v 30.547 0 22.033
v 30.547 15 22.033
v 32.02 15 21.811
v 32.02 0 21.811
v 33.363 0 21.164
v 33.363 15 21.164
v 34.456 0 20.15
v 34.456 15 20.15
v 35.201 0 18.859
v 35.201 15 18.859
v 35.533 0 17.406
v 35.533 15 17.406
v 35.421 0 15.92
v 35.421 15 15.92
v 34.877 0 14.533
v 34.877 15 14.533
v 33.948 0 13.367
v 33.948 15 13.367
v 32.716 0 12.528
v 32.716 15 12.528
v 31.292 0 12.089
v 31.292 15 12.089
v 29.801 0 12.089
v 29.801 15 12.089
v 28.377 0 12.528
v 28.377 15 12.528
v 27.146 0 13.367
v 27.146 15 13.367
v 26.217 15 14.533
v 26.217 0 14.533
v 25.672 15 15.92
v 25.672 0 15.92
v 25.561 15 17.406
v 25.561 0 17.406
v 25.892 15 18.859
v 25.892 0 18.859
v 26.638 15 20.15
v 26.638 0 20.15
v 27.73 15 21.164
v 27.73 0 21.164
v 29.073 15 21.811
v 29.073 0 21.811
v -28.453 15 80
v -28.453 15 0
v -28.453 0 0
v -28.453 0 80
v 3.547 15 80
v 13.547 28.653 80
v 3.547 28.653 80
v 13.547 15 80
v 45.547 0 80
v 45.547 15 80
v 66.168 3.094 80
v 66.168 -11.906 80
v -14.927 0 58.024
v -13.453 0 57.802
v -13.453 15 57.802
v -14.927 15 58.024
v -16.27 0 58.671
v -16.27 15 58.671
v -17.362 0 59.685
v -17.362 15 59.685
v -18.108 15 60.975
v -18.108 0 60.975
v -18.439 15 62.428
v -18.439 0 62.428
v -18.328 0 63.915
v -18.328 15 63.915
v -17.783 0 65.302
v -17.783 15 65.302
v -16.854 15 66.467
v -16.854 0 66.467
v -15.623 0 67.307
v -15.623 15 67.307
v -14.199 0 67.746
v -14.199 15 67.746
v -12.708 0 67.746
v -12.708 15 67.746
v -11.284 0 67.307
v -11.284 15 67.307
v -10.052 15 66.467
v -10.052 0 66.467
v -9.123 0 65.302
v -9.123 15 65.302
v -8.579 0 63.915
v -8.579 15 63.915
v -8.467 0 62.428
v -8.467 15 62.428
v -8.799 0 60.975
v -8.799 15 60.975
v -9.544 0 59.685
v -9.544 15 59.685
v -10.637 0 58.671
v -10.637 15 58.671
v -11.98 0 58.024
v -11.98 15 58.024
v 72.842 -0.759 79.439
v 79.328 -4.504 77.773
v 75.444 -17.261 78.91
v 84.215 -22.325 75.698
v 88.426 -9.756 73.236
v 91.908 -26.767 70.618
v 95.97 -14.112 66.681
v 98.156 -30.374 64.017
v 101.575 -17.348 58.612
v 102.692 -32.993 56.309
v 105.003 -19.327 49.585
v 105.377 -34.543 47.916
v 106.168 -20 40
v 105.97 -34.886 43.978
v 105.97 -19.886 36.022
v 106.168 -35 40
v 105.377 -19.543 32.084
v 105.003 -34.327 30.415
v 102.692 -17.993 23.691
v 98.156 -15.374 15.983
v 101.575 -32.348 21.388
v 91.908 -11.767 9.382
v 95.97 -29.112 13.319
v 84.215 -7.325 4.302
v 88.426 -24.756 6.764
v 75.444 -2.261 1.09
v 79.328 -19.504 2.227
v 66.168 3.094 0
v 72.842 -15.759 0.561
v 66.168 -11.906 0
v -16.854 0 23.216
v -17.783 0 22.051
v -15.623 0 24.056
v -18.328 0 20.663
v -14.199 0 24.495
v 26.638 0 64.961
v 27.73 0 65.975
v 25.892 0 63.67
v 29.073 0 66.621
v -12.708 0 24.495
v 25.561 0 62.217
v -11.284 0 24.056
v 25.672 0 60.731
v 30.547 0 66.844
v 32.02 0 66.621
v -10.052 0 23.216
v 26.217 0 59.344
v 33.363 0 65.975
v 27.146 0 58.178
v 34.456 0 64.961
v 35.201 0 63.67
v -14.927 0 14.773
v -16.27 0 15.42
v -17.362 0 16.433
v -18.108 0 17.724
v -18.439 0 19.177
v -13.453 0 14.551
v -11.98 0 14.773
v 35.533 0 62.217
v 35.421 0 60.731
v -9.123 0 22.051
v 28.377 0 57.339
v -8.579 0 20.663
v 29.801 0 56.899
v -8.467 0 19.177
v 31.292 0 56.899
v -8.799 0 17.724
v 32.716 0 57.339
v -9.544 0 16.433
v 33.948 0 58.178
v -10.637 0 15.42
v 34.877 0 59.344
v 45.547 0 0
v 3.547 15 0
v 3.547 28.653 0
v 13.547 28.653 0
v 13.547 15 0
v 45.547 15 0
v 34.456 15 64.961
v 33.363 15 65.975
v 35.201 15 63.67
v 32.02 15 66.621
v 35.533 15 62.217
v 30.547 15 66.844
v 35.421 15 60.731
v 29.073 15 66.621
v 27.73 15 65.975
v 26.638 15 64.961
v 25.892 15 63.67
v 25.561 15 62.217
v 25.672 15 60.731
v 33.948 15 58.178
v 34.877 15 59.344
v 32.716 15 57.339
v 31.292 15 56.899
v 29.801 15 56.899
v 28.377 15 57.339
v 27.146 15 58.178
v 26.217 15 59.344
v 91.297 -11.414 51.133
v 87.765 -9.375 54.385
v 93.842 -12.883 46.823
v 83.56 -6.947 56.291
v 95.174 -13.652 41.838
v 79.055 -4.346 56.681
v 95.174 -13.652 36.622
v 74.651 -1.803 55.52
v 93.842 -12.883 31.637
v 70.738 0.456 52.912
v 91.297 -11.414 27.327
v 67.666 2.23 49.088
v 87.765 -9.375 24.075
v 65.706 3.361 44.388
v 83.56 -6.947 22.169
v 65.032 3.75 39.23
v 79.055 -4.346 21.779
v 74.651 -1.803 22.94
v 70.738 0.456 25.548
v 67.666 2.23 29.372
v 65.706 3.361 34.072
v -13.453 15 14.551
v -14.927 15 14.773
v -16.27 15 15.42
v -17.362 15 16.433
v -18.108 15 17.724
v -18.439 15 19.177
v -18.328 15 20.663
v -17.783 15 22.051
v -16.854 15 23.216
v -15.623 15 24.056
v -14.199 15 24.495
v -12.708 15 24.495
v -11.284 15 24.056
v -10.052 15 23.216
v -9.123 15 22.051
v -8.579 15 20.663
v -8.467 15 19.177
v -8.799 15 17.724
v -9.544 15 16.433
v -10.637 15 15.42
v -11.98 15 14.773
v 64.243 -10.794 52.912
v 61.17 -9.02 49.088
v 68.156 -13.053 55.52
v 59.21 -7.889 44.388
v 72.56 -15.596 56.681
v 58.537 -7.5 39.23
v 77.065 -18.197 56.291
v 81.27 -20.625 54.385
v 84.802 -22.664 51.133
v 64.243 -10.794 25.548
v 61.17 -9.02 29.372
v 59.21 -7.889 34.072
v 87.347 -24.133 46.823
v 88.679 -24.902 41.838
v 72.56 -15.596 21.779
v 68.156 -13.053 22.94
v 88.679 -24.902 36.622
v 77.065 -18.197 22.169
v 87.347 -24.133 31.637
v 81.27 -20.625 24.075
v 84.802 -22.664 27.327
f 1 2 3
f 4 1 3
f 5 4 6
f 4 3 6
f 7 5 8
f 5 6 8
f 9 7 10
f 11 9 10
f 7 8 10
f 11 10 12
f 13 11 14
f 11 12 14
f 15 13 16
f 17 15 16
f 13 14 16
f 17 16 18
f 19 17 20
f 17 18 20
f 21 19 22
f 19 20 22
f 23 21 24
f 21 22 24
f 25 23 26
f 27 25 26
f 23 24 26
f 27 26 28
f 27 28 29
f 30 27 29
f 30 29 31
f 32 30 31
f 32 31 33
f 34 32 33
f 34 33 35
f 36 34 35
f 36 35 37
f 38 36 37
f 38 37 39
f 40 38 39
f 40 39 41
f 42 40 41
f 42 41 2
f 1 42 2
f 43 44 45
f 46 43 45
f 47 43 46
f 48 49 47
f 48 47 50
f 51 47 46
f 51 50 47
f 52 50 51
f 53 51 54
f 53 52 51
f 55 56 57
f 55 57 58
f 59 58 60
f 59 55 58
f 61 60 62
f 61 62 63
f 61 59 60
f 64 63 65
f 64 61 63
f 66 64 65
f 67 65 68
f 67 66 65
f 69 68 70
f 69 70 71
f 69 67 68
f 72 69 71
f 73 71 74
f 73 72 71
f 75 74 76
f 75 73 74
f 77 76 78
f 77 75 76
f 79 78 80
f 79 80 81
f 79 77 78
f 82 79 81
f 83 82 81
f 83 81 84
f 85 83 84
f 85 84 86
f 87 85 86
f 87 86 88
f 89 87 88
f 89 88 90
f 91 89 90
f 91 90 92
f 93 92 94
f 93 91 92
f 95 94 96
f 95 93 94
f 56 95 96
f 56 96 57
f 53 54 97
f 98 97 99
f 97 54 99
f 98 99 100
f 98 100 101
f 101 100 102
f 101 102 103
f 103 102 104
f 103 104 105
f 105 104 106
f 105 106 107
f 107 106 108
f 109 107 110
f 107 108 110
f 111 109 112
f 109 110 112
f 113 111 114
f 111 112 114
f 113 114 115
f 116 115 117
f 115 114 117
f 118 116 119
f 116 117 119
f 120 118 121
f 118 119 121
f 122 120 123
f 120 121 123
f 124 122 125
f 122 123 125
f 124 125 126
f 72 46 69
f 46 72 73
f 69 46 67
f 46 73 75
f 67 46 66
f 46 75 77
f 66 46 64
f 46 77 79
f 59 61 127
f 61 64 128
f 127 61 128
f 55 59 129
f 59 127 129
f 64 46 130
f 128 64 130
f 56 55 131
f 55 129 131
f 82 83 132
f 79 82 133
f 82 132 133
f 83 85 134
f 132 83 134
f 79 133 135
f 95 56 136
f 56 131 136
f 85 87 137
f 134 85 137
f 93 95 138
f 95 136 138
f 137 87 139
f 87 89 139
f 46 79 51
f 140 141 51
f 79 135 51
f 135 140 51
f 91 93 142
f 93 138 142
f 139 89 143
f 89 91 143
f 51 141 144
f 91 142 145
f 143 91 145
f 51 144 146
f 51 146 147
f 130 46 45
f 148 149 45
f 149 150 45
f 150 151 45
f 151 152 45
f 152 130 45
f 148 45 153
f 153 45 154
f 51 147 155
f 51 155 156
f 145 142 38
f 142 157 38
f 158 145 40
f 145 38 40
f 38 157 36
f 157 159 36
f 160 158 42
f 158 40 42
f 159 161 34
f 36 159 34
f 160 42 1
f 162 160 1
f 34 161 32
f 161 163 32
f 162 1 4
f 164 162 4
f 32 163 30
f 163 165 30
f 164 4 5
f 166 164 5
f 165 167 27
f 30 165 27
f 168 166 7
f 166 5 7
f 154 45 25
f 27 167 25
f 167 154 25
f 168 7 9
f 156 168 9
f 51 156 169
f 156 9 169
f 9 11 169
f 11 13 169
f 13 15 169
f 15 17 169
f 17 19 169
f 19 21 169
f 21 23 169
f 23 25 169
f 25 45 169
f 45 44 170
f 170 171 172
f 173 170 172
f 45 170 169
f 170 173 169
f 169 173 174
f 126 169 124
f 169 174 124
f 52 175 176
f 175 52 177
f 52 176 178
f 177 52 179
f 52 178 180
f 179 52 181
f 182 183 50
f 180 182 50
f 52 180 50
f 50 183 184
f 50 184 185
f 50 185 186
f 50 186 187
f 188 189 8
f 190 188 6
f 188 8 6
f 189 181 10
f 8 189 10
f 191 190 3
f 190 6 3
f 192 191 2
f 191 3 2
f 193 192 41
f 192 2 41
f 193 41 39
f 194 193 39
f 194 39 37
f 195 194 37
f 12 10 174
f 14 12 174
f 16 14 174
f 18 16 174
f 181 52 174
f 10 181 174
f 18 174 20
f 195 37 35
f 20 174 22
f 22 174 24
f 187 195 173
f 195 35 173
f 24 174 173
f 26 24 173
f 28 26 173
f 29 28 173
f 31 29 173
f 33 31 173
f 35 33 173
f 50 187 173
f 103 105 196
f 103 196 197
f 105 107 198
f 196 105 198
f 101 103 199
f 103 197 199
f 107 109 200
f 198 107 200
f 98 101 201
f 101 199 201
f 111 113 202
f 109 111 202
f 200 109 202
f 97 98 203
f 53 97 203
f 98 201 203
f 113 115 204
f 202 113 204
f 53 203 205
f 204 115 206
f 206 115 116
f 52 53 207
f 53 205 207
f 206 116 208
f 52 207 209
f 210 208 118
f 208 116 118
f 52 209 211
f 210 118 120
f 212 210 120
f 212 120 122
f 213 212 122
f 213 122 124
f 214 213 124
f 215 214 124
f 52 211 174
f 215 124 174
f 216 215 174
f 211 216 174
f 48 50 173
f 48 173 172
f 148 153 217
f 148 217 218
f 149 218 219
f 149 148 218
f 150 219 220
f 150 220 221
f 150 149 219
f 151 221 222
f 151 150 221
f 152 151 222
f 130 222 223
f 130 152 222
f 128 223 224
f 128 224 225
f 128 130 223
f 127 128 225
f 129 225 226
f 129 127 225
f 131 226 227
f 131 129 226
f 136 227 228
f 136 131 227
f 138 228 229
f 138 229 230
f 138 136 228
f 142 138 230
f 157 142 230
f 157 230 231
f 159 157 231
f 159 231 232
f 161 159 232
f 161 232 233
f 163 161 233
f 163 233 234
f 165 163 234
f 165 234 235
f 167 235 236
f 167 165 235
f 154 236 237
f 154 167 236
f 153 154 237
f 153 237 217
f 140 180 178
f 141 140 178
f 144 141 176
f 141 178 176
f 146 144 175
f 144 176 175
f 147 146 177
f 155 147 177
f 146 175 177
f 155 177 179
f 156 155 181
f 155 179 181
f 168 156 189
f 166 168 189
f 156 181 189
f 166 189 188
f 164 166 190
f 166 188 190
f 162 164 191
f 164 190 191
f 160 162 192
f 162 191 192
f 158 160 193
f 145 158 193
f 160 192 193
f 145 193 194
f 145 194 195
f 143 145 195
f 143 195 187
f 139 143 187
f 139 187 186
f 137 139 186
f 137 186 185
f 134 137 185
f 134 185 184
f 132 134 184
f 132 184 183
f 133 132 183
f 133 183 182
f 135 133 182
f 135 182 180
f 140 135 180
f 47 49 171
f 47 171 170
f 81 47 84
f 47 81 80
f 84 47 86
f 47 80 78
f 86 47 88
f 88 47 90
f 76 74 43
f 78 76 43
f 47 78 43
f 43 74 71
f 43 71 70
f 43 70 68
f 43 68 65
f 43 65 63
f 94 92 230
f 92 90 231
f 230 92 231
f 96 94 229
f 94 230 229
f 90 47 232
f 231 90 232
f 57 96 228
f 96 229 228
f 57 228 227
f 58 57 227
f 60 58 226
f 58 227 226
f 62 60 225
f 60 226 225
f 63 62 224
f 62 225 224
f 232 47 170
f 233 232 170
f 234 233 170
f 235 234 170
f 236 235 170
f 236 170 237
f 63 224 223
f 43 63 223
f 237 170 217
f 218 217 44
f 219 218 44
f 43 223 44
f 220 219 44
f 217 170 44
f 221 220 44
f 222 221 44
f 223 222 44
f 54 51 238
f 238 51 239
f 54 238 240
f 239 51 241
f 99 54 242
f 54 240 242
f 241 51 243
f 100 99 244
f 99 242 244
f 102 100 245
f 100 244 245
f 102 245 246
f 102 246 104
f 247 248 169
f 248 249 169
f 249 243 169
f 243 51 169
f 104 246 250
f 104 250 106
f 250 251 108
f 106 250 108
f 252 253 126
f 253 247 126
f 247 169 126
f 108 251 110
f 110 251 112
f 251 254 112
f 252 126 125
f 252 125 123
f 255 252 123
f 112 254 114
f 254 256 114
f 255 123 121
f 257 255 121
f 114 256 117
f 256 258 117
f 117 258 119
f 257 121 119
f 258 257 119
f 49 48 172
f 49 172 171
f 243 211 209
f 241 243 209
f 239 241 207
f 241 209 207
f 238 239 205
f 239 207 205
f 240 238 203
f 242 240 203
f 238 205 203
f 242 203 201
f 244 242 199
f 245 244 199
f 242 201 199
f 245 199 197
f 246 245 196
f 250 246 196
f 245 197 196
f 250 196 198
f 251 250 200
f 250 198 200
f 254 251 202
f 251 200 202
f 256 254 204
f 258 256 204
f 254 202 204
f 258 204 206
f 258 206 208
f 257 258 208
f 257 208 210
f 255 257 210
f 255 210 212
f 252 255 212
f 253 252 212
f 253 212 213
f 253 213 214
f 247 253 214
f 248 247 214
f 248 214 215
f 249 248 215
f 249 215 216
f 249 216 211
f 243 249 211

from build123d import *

# Parameters (mm, degrees)
BOSS_EXTRUDE1_DEPTH = 80
FILLET1_R           = 40
SKETCH3_R           = 5
CUT_EXTRUDE3_DEPTH  = 15
SKETCH4_R           = 5
CUT_EXTRUDE4_DEPTH  = 80
SKETCH5_R           = 17.5
CUT_EXTRUDE5_DEPTH  = 26


with BuildPart() as part:
    # Sketch2 → Boss-Extrude1 (new body)
    with BuildSketch(Plane.XY):
        Polygon((-28.453333333, 0), (45.546666667, 0), (106.168444932, -35), (106.168444932, -20), (45.546666667, 15), (13.546666667, 15), (13.546666667, 28.653333333), (3.546666667, 28.653333333), (3.546666667, 15), (-28.453333333, 15), align=None)
    extrude(amount=BOSS_EXTRUDE1_DEPTH)

    # Fillet1
    # the kernel refuses this fillet: 40 mm, written as the material it takes off along each edge
    with BuildSketch(Plane(origin=(106.168444932, -135, 0), x_dir=(0, 0, 1), z_dir=(0, 1, 0))) as fillet1_piece_1:
        with BuildLine():
            CenterArc((FILLET1_R, -FILLET1_R), FILLET1_R, 90, 90)
            Line((0, -FILLET1_R), (0, 0))
            Line((0, 0), (FILLET1_R, 0))
        make_face()
    extrude(amount=215, mode=Mode.SUBTRACT)
    with BuildSketch(Plane(origin=(106.168444932, -135, 80), x_dir=(0, 0, -1), z_dir=(0, 1, 0))) as fillet1_piece_2:
        with BuildLine():
            CenterArc((FILLET1_R, FILLET1_R), FILLET1_R, 180, 90)
            Line((0, FILLET1_R), (0, 0))
            Line((0, 0), (FILLET1_R, 0))
        make_face()
    extrude(amount=215, mode=Mode.SUBTRACT)

    # Sketch3 → Cut-Extrude3 (cut)
    with BuildSketch(Plane(origin=(0, 0, 0), x_dir=(1, 0, 0), z_dir=(0, 1, 0))):
        with Locations(Location((-13.453333333, -19.550801078, 0), (0, 0, 90))):
            Circle(SKETCH3_R)
        with Locations(Location((-13.453333333, -62.802123194, 0), (0, 0, 90))):
            Circle(SKETCH3_R)
    extrude(amount=CUT_EXTRUDE3_DEPTH, mode=Mode.SUBTRACT)

    # Sketch4 → Cut-Extrude4 (cut)
    with BuildSketch(Plane(origin=(0, 15, 0), x_dir=(1, 0, 0), z_dir=(0, 1, 0))):
        with Locations(Location((30.546666667, -17.032746755, 0), (0, 0, 270))):
            Circle(SKETCH4_R)
        with Locations(Location((30.546666667, -61.843602222, 0), (0, 0, 270))):
            Circle(SKETCH4_R)
    extrude(amount=-CUT_EXTRUDE4_DEPTH, mode=Mode.SUBTRACT)

    # Sketch5 → Cut-Extrude5 (cut)
    with BuildSketch(Plane(origin=(17.881857195, 30.972285196, 0), x_dir=(0.866025403784438, -0.5000000000000011, 0), z_dir=(0.5000000000000011, 0.8660254037844382, 0))):
        with Locations(Location((71.944570391, -39.229988433, 0), (0, 0, 180))):
            Circle(SKETCH5_R)
    extrude(amount=-CUT_EXTRUDE5_DEPTH, mode=Mode.SUBTRACT)


solid = part.part
